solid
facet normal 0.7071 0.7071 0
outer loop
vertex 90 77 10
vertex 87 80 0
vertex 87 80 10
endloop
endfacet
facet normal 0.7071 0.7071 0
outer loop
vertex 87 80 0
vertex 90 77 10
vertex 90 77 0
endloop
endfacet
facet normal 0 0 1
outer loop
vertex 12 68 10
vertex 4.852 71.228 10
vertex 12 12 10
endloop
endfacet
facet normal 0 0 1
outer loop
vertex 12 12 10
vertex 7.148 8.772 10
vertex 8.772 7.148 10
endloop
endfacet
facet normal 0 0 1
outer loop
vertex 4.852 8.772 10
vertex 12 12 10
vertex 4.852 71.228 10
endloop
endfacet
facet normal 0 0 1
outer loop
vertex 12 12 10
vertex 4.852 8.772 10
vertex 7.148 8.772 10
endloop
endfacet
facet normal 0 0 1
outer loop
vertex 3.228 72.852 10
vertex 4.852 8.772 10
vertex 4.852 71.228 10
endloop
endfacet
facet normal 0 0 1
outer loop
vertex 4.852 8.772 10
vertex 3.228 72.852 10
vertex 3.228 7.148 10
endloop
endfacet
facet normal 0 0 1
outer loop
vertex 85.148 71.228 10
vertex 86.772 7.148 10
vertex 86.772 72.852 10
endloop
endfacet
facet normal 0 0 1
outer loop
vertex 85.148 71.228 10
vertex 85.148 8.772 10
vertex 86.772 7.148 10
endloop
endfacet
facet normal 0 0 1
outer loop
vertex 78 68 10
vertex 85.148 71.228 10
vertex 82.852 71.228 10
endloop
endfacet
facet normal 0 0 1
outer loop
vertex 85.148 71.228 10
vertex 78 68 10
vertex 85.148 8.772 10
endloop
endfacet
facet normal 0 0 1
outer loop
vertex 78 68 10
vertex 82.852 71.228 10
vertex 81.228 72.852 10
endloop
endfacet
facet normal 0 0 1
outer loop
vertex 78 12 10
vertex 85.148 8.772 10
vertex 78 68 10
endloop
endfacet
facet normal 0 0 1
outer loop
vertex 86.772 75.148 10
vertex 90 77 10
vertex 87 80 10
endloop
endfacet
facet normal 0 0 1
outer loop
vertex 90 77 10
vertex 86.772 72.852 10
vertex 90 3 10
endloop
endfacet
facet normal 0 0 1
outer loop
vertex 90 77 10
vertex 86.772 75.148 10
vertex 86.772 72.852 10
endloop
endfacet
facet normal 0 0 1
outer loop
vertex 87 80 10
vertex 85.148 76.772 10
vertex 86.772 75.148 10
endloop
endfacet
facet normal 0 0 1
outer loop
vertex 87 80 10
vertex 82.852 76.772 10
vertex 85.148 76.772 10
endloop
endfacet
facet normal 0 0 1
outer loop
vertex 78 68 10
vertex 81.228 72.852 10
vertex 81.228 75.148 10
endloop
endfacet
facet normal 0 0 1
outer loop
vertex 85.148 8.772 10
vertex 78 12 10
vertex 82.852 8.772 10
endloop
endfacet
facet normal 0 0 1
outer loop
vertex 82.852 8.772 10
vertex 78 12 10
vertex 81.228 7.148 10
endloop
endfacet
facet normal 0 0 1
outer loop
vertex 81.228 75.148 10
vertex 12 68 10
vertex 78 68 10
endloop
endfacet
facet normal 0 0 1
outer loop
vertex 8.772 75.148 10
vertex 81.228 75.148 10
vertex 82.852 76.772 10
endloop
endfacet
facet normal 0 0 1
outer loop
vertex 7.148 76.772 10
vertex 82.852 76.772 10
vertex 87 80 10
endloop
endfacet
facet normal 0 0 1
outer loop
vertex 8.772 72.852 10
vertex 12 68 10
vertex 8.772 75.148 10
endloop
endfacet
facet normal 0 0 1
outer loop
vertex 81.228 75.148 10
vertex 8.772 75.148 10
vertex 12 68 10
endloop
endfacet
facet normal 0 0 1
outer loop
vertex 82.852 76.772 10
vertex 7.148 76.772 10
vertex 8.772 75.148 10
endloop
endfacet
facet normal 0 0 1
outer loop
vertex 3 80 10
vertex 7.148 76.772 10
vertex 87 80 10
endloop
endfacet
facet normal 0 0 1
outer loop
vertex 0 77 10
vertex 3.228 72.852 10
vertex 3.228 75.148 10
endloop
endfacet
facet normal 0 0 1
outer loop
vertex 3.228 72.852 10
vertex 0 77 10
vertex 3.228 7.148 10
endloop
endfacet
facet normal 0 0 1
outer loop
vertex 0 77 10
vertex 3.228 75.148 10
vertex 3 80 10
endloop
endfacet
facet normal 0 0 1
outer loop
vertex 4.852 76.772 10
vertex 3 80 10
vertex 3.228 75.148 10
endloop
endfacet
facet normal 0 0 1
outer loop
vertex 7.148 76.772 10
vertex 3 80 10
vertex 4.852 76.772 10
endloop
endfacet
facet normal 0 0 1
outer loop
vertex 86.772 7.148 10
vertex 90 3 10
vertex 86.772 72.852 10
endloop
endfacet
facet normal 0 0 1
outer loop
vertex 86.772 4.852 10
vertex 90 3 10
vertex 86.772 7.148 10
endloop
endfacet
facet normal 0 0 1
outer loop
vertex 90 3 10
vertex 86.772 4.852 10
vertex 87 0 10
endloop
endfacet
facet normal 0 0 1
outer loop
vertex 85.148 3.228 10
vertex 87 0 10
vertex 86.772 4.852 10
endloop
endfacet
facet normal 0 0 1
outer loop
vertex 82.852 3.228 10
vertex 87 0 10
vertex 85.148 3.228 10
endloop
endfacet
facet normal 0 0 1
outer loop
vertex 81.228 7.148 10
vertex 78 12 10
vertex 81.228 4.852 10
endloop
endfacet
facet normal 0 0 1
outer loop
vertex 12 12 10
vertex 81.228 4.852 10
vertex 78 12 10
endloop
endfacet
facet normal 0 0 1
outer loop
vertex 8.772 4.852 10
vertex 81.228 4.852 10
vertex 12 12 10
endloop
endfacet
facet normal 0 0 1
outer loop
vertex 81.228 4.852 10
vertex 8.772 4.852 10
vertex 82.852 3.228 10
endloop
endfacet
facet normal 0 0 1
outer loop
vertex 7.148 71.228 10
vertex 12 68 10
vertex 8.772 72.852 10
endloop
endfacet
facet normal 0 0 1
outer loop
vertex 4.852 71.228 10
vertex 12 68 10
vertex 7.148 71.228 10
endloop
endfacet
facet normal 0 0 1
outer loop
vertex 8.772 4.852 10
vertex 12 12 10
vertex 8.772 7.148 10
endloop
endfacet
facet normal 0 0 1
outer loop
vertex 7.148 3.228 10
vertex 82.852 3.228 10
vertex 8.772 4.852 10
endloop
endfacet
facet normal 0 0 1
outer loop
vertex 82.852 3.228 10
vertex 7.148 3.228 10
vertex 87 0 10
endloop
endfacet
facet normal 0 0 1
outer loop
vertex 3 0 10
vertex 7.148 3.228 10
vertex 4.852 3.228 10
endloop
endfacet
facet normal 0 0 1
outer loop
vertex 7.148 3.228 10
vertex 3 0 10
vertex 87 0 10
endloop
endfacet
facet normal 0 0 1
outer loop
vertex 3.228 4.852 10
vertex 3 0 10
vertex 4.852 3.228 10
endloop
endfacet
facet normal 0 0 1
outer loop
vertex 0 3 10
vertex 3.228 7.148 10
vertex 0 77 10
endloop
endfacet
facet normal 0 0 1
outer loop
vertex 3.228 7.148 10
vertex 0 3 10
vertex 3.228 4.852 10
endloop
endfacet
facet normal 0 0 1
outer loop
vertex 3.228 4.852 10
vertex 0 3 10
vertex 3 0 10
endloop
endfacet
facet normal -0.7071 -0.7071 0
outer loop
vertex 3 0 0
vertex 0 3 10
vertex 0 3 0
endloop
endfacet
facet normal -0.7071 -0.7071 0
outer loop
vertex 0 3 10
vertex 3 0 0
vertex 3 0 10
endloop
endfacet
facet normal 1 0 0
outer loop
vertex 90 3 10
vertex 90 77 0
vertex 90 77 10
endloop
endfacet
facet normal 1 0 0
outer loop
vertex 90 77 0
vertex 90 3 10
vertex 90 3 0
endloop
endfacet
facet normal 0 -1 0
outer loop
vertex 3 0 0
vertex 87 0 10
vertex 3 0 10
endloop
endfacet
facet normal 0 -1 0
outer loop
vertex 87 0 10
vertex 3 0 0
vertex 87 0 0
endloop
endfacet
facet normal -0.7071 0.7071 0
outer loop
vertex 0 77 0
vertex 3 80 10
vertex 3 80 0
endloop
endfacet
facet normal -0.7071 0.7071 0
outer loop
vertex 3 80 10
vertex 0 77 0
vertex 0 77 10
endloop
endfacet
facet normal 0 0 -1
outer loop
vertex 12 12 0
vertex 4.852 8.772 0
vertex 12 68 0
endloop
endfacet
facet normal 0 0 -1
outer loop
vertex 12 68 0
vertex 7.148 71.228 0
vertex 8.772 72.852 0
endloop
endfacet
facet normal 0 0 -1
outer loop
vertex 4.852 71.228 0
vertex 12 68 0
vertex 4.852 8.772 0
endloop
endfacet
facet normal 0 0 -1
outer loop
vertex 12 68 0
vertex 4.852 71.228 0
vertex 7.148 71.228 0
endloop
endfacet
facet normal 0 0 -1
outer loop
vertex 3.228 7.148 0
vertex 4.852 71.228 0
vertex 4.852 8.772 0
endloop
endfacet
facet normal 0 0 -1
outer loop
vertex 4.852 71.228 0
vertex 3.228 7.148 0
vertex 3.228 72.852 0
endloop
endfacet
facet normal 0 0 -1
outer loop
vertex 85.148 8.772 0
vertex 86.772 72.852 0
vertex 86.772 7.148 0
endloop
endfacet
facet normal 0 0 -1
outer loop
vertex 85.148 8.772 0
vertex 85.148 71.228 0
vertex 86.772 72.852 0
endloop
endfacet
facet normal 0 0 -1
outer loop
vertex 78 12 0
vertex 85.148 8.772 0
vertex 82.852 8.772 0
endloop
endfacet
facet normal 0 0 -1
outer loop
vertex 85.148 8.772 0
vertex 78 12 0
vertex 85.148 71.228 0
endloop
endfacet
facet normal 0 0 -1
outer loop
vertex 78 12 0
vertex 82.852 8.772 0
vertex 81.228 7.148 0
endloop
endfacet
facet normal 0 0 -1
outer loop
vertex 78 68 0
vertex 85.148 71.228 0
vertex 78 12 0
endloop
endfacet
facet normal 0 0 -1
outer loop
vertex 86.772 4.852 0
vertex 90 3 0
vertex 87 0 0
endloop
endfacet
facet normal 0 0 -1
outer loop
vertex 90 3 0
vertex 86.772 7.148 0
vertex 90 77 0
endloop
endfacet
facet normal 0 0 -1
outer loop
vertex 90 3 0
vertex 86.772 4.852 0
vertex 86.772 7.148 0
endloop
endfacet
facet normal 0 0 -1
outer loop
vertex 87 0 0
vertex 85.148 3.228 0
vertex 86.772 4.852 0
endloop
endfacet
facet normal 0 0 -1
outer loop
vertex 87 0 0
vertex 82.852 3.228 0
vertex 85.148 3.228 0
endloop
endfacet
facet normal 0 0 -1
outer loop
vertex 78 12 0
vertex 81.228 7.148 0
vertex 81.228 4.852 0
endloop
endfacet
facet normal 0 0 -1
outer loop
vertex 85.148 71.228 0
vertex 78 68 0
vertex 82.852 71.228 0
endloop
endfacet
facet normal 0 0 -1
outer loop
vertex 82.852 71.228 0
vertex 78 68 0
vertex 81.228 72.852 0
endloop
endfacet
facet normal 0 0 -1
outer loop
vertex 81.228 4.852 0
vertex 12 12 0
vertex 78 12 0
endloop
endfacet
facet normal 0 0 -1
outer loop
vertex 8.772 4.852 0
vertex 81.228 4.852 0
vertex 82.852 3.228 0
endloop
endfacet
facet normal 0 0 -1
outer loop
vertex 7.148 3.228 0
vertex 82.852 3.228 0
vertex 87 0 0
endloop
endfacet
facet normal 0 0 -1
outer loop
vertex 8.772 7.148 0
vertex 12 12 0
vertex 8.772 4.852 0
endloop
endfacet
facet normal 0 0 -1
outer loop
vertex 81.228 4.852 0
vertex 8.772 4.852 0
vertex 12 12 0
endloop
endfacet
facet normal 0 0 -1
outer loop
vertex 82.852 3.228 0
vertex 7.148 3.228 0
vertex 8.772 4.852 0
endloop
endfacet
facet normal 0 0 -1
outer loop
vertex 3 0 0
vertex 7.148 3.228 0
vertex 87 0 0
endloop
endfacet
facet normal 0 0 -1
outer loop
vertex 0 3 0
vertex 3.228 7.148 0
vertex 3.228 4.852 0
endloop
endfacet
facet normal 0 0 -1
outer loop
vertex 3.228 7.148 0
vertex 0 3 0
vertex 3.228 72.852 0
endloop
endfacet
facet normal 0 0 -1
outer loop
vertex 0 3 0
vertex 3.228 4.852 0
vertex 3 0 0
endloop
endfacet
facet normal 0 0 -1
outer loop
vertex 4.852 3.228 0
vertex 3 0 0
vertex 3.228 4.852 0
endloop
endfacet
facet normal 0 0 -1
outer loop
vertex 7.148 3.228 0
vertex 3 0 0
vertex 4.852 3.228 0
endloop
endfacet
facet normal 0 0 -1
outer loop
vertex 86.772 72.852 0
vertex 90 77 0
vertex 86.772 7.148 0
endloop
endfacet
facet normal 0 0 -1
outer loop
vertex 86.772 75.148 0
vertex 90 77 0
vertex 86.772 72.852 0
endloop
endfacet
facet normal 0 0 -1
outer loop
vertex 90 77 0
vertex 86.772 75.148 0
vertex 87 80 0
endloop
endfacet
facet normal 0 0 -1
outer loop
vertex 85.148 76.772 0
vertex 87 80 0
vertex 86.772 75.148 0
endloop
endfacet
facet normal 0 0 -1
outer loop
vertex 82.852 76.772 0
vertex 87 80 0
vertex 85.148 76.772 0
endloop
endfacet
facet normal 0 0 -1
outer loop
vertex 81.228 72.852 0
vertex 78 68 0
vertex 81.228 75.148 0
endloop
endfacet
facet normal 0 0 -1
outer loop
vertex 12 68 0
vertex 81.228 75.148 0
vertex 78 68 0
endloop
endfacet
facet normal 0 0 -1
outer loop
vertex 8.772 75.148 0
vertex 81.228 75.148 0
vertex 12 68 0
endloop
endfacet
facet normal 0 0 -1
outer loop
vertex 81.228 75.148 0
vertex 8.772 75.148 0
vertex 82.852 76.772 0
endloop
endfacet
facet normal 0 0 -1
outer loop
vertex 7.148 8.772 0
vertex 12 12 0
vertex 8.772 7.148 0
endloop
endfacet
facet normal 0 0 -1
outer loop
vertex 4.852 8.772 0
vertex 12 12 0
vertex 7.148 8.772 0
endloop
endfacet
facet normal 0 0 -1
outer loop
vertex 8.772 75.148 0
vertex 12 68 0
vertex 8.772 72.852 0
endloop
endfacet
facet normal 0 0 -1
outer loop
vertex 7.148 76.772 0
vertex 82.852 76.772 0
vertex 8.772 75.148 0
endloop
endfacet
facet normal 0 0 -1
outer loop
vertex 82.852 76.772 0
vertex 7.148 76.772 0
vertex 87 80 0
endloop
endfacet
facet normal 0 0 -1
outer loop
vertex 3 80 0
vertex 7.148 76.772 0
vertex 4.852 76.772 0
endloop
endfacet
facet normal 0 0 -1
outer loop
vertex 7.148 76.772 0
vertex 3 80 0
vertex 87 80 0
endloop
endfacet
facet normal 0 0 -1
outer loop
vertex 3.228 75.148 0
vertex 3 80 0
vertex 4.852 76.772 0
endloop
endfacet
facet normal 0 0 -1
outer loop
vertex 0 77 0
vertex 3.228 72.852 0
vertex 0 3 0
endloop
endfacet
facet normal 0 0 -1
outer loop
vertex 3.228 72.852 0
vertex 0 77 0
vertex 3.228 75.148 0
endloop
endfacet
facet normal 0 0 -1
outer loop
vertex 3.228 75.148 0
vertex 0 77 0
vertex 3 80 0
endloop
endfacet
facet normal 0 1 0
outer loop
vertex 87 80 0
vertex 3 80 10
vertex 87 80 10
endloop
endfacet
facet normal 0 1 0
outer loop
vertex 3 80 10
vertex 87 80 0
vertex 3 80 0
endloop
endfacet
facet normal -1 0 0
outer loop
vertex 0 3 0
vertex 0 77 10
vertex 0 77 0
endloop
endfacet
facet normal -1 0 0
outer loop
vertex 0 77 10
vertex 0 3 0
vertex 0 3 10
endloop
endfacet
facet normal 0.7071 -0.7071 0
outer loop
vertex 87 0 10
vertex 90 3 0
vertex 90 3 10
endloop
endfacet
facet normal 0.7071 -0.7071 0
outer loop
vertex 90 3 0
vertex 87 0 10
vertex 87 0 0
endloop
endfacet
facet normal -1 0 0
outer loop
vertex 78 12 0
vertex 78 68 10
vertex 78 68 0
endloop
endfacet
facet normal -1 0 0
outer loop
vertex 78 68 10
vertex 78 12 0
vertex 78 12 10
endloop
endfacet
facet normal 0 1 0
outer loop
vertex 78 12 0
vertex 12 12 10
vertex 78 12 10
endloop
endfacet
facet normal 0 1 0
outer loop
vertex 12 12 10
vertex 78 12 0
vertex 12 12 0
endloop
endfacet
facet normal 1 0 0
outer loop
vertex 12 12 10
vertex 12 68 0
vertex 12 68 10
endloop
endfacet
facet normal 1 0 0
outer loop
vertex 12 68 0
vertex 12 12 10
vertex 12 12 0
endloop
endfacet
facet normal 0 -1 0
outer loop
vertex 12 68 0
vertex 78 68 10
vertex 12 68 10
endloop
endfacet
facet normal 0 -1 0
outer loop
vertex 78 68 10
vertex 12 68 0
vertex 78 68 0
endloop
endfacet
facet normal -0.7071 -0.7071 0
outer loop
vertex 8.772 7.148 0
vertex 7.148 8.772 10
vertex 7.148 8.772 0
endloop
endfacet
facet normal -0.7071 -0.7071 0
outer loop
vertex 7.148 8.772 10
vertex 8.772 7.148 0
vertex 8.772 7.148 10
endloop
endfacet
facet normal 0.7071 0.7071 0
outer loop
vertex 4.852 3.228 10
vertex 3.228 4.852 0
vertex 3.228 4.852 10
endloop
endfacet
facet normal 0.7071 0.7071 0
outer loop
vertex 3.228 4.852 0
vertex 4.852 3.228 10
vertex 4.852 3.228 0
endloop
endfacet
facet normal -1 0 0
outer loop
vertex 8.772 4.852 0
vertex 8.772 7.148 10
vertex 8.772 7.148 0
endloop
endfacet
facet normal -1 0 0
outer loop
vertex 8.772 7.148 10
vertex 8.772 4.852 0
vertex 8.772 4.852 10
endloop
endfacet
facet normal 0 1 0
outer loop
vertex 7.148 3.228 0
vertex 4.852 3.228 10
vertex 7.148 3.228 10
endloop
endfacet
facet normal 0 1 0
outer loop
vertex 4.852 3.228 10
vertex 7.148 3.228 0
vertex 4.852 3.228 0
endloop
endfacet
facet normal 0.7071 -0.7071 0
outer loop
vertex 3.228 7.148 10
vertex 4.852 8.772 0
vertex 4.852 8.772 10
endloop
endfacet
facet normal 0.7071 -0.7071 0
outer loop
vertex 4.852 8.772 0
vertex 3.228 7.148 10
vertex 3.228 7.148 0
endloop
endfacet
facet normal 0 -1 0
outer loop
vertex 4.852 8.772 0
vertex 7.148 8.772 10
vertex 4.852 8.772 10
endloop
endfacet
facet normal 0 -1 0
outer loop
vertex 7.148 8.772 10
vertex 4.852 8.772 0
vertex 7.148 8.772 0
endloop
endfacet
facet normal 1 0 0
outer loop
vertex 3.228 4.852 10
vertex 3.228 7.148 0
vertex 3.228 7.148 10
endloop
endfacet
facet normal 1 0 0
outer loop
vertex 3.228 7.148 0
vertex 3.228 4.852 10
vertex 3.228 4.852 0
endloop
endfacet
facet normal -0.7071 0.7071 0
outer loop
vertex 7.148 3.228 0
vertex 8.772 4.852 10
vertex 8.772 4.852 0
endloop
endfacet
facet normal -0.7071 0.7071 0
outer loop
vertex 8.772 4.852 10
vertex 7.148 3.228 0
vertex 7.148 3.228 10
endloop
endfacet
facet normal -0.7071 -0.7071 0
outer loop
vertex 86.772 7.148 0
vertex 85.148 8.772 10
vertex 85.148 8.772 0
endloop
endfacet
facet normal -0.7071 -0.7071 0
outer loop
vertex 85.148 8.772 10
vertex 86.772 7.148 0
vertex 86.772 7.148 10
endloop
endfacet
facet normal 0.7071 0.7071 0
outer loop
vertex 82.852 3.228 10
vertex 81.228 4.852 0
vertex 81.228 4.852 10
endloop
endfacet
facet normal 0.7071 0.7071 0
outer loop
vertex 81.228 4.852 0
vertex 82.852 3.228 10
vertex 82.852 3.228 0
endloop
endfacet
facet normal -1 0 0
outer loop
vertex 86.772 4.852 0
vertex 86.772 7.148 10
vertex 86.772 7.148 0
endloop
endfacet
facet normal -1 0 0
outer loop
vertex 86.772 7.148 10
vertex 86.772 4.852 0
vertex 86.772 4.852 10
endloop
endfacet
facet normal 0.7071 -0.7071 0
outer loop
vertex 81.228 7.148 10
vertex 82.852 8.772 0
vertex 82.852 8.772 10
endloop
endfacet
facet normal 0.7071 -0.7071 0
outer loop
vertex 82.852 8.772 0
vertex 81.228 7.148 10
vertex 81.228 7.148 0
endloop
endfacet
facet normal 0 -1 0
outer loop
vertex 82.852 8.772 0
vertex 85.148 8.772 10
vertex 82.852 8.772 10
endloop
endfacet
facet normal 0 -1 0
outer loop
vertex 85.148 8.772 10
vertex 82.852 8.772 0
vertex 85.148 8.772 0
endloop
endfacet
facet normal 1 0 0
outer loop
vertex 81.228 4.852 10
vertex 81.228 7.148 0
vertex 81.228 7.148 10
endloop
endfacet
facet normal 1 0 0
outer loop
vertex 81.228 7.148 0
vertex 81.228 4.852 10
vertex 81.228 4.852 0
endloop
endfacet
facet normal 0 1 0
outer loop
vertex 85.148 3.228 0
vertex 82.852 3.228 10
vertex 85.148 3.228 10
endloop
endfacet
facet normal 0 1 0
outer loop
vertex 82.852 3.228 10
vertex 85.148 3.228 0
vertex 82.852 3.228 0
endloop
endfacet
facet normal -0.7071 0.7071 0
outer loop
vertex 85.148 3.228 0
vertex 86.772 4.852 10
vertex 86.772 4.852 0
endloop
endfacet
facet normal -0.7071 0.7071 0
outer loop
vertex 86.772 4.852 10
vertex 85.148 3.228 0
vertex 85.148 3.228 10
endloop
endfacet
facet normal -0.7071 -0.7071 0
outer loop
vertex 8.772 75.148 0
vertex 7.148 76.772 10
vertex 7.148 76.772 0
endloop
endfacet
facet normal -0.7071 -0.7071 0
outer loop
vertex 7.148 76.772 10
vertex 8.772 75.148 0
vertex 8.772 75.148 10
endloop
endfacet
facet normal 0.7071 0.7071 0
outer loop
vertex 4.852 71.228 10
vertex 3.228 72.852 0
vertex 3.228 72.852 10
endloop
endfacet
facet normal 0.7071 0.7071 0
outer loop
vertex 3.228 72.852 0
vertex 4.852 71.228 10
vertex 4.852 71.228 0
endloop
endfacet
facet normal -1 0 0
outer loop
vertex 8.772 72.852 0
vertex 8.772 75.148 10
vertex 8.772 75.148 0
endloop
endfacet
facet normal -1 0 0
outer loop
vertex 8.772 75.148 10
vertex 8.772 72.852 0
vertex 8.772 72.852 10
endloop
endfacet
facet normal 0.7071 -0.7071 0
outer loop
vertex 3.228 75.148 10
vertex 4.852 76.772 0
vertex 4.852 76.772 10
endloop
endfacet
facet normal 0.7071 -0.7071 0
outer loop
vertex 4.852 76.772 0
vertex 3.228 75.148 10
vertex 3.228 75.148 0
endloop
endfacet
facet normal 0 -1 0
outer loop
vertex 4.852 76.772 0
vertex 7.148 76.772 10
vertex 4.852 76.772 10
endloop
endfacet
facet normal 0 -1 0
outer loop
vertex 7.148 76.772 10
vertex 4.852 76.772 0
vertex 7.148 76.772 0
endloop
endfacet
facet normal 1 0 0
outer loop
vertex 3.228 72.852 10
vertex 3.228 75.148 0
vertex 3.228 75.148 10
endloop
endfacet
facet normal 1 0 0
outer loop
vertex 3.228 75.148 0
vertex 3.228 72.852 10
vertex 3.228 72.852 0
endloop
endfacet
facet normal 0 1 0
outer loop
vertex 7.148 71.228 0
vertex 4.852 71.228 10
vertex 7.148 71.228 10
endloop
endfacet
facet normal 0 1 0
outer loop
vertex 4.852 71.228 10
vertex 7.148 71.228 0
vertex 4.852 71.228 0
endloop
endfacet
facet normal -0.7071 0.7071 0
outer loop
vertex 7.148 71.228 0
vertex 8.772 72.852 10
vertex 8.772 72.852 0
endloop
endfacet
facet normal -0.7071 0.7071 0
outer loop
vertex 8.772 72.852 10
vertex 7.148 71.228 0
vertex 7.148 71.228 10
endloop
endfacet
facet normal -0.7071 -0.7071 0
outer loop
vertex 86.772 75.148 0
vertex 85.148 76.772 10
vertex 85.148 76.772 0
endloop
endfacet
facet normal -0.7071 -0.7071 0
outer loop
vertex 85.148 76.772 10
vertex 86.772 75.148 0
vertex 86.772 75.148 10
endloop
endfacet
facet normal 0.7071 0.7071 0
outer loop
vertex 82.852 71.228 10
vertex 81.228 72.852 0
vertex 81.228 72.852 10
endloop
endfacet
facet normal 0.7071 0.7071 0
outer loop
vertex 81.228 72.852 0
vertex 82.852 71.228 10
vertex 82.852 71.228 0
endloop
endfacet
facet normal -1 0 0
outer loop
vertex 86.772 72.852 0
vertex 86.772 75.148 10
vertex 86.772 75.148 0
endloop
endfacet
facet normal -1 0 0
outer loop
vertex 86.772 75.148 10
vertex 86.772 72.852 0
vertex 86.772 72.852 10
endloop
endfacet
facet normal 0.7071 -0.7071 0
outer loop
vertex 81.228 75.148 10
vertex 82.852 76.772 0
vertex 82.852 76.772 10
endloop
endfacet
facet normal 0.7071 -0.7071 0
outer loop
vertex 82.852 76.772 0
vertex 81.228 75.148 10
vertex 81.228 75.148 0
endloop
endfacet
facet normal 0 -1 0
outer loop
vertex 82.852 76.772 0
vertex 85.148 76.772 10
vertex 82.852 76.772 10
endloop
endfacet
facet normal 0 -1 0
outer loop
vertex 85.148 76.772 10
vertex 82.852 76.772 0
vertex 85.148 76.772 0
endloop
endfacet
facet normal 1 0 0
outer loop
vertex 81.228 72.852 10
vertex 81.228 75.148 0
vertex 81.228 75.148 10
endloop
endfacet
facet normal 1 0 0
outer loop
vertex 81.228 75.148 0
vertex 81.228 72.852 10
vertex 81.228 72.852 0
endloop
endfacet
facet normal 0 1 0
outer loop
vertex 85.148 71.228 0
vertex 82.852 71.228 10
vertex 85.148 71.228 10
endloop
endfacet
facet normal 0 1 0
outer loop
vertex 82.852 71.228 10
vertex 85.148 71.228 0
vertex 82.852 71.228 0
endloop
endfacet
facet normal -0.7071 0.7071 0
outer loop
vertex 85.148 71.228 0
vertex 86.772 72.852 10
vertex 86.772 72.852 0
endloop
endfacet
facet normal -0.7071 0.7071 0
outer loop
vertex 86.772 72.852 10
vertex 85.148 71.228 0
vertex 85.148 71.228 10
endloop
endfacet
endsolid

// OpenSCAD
$fn = 32;

// ----------------------------------------------------------------------
// Frame plate: 90 x 80 frame, 12 mm rails
// ----------------------------------------------------------------------

// --- parameters (mm) ---
plate_l = 90;             // plate length, X
plate_w = 80;             // plate width, Y
plate_t = 10;             // plate thickness, Z (extrusion height)
corner_c = 3;             // corner chamfer
frame_bar = 12;           // frame rail width
bolt_r = 3;               // corner bolt window radius
bolt_inset = 6;           // bolt centre inset from the edges

win_l = plate_l - 2 * frame_bar;  // window length
win_w = plate_w - 2 * frame_bar;  // window width
bolt_d = 2 * bolt_r;  // corner hole diameter

profile = [[3, 0], [87, 0], [90, 3], [90, 77], [87, 80], [3, 80], [0, 77], [0, 3]];  // primary outline, 8 points, counter clockwise
void_1 = [[12, 12], [78, 12], [78, 68], [12, 68]];  // the window, 4 points
void_2 = [[8.772, 7.148], [7.148, 8.772], [4.852, 8.772], [3.228, 7.148], [3.228, 4.852], [4.852, 3.228], [7.148, 3.228], [8.772, 4.852]];  // corner bolt window, 8 points
void_3 = [[86.772, 7.148], [85.148, 8.772], [82.852, 8.772], [81.228, 7.148], [81.228, 4.852], [82.852, 3.228], [85.148, 3.228], [86.772, 4.852]];  // corner bolt window, 8 points
void_4 = [[8.772, 75.148], [7.148, 76.772], [4.852, 76.772], [3.228, 75.148], [3.228, 72.852], [4.852, 71.228], [7.148, 71.228], [8.772, 72.852]];  // corner bolt window, 8 points
void_5 = [[86.772, 75.148], [85.148, 76.772], [82.852, 76.772], [81.228, 75.148], [81.228, 72.852], [82.852, 71.228], [85.148, 71.228], [86.772, 72.852]];  // corner bolt window, 8 points

// --- the one profile operation ---
difference() {
  linear_extrude(height = plate_t) polygon(points = profile);
  translate([0, 0, -1])
    linear_extrude(height = plate_t + 2) polygon(points = void_1);
  translate([0, 0, -1])
    linear_extrude(height = plate_t + 2) polygon(points = void_2);
  translate([0, 0, -1])
    linear_extrude(height = plate_t + 2) polygon(points = void_3);
  translate([0, 0, -1])
    linear_extrude(height = plate_t + 2) polygon(points = void_4);
  translate([0, 0, -1])
    linear_extrude(height = plate_t + 2) polygon(points = void_5);
}
